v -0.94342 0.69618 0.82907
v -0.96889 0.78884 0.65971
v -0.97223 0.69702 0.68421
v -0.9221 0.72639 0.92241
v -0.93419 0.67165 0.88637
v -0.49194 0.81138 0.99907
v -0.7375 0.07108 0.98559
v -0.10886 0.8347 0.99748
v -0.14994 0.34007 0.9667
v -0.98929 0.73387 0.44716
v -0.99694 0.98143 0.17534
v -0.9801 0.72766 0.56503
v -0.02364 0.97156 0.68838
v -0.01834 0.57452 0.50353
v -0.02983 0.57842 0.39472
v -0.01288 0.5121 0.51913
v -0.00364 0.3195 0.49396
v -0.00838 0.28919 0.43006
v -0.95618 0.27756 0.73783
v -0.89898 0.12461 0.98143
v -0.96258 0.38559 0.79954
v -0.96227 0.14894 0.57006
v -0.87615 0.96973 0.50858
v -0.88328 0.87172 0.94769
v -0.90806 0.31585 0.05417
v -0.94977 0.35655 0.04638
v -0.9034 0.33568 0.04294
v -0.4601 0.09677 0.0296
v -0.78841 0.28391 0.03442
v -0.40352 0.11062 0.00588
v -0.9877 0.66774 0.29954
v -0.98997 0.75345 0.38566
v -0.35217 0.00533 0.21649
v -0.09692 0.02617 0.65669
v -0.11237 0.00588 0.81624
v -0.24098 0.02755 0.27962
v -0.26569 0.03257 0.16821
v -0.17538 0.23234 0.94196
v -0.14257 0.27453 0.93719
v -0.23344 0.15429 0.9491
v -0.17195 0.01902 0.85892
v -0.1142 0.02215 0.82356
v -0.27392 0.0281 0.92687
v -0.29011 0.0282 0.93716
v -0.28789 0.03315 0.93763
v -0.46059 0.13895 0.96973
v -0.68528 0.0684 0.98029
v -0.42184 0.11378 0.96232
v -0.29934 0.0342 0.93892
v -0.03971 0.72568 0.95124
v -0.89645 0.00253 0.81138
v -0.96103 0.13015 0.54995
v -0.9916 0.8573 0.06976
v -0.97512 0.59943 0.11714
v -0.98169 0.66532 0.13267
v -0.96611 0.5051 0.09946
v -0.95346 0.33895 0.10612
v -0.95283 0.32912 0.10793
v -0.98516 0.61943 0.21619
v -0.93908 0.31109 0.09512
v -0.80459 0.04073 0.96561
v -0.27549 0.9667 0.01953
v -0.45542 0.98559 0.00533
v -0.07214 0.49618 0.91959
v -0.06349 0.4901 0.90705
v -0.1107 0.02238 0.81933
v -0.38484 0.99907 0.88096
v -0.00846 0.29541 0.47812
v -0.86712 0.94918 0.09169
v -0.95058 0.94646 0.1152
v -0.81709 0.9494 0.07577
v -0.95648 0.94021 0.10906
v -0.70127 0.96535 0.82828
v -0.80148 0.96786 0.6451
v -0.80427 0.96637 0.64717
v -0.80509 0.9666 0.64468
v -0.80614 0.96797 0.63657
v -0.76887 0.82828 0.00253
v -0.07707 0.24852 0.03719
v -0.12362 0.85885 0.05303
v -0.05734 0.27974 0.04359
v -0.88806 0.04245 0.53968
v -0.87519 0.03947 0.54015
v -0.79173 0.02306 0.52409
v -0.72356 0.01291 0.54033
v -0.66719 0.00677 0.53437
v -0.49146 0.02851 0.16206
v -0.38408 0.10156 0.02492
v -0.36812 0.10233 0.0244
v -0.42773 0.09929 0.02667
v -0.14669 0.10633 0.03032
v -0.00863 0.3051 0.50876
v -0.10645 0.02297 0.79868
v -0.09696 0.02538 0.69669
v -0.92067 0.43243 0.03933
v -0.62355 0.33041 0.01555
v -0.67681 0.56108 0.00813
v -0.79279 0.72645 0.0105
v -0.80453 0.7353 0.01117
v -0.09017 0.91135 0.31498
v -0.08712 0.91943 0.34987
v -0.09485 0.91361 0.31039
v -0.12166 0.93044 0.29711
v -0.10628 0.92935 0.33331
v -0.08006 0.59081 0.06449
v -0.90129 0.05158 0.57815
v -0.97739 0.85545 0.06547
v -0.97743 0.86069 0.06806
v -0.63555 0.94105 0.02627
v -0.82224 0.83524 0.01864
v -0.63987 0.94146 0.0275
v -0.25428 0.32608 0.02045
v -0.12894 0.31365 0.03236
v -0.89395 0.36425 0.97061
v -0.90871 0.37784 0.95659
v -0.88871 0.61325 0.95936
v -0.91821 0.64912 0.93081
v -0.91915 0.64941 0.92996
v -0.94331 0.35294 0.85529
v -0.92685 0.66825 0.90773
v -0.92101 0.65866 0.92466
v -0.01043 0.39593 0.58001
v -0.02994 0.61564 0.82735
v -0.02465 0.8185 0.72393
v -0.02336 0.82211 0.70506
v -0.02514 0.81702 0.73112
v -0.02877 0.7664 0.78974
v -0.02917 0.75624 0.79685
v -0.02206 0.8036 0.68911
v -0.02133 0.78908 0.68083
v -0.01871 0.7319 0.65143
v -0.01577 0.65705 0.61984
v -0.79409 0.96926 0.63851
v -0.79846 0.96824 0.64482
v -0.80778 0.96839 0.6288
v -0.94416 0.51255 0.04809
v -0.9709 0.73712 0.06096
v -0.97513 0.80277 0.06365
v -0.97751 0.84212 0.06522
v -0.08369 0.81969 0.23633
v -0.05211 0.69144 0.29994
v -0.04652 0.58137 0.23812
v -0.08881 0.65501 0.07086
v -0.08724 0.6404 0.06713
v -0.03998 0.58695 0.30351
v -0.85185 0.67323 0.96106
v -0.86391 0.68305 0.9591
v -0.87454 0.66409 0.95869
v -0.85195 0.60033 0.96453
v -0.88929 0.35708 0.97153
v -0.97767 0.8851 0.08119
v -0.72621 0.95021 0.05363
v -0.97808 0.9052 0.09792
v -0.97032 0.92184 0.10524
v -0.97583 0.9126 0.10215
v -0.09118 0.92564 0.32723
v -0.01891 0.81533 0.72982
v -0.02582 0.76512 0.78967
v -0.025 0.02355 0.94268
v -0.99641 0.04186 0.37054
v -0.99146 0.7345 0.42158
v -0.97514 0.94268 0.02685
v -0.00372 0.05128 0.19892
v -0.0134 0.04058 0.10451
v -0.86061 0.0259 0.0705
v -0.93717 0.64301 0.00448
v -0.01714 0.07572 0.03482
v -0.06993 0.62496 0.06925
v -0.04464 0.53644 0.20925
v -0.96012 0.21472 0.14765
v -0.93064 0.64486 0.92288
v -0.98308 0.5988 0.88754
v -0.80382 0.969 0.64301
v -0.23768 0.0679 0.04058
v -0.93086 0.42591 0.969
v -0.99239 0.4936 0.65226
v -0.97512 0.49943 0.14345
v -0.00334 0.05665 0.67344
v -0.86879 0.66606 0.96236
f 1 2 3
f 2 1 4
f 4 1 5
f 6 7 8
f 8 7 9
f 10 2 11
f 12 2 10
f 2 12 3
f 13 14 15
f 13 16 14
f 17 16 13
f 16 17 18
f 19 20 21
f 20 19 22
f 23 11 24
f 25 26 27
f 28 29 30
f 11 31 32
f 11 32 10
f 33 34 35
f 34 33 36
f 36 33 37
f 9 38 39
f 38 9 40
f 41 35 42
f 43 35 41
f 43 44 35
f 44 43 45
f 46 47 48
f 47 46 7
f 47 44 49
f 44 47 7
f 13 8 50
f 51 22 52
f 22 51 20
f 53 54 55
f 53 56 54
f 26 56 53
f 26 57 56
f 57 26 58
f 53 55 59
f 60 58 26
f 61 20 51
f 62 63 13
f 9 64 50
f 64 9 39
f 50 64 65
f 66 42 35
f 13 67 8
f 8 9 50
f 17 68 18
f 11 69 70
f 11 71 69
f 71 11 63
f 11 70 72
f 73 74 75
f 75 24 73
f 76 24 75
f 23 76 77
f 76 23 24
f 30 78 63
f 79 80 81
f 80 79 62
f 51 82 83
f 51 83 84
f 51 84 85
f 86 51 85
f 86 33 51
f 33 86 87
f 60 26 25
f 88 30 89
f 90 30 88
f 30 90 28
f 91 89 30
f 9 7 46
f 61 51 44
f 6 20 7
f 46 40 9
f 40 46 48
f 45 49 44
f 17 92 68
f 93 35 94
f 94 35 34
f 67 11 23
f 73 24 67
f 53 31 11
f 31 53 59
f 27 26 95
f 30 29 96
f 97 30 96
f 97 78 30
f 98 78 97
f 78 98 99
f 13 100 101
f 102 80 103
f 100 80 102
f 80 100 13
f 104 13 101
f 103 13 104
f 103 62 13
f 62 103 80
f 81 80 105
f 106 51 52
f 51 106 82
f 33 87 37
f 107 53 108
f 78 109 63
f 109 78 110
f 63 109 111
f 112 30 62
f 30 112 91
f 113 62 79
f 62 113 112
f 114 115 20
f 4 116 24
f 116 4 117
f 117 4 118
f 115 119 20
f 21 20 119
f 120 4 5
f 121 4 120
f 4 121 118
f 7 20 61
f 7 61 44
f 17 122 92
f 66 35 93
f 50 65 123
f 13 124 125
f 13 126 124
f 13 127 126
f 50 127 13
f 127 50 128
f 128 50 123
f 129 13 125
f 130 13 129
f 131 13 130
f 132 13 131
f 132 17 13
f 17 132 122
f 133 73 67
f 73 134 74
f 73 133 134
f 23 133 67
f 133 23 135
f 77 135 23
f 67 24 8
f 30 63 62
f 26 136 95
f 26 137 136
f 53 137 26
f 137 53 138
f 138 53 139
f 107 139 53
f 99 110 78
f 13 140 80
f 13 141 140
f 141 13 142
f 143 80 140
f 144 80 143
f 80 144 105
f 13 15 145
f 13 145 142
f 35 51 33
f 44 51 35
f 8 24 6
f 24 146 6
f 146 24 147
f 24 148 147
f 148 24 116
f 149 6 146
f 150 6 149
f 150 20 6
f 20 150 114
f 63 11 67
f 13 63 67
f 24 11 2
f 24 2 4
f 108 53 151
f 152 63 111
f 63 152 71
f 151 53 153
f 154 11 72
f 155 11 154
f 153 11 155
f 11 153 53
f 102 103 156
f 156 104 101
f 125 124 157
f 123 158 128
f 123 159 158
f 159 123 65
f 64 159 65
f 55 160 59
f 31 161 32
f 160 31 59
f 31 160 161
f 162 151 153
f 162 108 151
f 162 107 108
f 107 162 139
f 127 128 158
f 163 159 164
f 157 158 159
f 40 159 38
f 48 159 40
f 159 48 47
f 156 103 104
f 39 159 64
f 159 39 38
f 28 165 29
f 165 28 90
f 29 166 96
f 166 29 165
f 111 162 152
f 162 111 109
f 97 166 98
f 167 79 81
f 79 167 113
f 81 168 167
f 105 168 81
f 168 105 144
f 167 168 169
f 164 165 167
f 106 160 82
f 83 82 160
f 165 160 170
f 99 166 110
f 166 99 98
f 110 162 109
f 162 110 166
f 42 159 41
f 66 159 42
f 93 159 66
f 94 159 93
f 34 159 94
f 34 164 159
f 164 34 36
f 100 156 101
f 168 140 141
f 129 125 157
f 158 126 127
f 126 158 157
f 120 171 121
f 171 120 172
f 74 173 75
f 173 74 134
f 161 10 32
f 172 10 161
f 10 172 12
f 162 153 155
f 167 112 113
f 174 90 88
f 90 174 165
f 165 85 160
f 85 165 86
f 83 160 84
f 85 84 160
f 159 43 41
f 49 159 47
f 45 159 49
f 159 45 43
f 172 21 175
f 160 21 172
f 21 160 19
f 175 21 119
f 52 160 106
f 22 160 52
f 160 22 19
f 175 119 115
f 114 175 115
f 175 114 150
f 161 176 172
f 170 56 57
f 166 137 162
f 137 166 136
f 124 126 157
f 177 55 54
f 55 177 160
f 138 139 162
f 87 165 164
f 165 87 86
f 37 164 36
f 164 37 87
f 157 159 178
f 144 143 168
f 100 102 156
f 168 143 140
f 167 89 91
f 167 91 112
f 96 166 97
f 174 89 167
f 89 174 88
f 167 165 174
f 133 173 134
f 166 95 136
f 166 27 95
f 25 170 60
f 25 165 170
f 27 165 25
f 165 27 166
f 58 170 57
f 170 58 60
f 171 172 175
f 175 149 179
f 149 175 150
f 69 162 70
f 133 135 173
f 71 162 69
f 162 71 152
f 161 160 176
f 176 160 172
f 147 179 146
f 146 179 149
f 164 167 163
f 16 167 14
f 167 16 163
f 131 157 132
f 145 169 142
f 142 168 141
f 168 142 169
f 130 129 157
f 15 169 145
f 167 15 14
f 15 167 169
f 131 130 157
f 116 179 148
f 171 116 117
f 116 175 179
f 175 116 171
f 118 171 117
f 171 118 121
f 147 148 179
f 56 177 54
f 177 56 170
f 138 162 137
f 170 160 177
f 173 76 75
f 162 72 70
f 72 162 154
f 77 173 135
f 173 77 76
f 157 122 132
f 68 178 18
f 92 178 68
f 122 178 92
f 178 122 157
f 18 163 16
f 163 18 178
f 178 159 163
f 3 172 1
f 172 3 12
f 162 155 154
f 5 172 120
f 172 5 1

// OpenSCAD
translate([1,0,0])boulder(rands(0,1000,1)[0]);
translate([-1,0,0]) cutstone(rands(0,1000,1)[0]);
module boulder(bseed)
{
  loops=6;
       n=10;// num faces  
 l=n*5;// num points
      

                       ri=rands(0,360,l,bseed); // NEED TO USE rseed
                t=rands(-180,180,l,bseed+1);  // NEED TO USE rseed

       for(loop=[0:loops]){

                v21=rands(0,l-1,n*3+1,bseed+loop);// NEED TO USE rseed

        v1 = [ for(i=[0:l])               
                [sin(ri[i])*cos(t[i]),cos(ri[i])*cos(t[i]),sin(t[i])]];

        v2 = [for(j=[0:n])[v21[j],v21[j+n],v21[j+n+n]]]; 
            // NEED TO USE rseed
         
        color("Gray")
        hull()
     scale(0,5)  polyhedron(v1, v2);

    }
}

module cutstone(bseed)
{
  loops=1;
        l=200;// num points
        n=100;// num faces

       
       for(loop=[0:loops]){

                l1=rands(0,1,l*3+3,bseed+loop); // NEED TO USE rseed
                v21=rands(0,l-1,n*3+1,bseed+loop);// NEED TO USE rseed

        v1 = [ for(i=[0:l])               
                [l1[i],l1[i+l],l1[i+l+1]]
];

        v2 = [for(j=[0:n])[v21[j],v21[j+n],v21[j+n+n]]]; 
            // NEED TO USE rseed
         
        color("Gray")
        hull()
       polyhedron(v1, v2);

    }
}
